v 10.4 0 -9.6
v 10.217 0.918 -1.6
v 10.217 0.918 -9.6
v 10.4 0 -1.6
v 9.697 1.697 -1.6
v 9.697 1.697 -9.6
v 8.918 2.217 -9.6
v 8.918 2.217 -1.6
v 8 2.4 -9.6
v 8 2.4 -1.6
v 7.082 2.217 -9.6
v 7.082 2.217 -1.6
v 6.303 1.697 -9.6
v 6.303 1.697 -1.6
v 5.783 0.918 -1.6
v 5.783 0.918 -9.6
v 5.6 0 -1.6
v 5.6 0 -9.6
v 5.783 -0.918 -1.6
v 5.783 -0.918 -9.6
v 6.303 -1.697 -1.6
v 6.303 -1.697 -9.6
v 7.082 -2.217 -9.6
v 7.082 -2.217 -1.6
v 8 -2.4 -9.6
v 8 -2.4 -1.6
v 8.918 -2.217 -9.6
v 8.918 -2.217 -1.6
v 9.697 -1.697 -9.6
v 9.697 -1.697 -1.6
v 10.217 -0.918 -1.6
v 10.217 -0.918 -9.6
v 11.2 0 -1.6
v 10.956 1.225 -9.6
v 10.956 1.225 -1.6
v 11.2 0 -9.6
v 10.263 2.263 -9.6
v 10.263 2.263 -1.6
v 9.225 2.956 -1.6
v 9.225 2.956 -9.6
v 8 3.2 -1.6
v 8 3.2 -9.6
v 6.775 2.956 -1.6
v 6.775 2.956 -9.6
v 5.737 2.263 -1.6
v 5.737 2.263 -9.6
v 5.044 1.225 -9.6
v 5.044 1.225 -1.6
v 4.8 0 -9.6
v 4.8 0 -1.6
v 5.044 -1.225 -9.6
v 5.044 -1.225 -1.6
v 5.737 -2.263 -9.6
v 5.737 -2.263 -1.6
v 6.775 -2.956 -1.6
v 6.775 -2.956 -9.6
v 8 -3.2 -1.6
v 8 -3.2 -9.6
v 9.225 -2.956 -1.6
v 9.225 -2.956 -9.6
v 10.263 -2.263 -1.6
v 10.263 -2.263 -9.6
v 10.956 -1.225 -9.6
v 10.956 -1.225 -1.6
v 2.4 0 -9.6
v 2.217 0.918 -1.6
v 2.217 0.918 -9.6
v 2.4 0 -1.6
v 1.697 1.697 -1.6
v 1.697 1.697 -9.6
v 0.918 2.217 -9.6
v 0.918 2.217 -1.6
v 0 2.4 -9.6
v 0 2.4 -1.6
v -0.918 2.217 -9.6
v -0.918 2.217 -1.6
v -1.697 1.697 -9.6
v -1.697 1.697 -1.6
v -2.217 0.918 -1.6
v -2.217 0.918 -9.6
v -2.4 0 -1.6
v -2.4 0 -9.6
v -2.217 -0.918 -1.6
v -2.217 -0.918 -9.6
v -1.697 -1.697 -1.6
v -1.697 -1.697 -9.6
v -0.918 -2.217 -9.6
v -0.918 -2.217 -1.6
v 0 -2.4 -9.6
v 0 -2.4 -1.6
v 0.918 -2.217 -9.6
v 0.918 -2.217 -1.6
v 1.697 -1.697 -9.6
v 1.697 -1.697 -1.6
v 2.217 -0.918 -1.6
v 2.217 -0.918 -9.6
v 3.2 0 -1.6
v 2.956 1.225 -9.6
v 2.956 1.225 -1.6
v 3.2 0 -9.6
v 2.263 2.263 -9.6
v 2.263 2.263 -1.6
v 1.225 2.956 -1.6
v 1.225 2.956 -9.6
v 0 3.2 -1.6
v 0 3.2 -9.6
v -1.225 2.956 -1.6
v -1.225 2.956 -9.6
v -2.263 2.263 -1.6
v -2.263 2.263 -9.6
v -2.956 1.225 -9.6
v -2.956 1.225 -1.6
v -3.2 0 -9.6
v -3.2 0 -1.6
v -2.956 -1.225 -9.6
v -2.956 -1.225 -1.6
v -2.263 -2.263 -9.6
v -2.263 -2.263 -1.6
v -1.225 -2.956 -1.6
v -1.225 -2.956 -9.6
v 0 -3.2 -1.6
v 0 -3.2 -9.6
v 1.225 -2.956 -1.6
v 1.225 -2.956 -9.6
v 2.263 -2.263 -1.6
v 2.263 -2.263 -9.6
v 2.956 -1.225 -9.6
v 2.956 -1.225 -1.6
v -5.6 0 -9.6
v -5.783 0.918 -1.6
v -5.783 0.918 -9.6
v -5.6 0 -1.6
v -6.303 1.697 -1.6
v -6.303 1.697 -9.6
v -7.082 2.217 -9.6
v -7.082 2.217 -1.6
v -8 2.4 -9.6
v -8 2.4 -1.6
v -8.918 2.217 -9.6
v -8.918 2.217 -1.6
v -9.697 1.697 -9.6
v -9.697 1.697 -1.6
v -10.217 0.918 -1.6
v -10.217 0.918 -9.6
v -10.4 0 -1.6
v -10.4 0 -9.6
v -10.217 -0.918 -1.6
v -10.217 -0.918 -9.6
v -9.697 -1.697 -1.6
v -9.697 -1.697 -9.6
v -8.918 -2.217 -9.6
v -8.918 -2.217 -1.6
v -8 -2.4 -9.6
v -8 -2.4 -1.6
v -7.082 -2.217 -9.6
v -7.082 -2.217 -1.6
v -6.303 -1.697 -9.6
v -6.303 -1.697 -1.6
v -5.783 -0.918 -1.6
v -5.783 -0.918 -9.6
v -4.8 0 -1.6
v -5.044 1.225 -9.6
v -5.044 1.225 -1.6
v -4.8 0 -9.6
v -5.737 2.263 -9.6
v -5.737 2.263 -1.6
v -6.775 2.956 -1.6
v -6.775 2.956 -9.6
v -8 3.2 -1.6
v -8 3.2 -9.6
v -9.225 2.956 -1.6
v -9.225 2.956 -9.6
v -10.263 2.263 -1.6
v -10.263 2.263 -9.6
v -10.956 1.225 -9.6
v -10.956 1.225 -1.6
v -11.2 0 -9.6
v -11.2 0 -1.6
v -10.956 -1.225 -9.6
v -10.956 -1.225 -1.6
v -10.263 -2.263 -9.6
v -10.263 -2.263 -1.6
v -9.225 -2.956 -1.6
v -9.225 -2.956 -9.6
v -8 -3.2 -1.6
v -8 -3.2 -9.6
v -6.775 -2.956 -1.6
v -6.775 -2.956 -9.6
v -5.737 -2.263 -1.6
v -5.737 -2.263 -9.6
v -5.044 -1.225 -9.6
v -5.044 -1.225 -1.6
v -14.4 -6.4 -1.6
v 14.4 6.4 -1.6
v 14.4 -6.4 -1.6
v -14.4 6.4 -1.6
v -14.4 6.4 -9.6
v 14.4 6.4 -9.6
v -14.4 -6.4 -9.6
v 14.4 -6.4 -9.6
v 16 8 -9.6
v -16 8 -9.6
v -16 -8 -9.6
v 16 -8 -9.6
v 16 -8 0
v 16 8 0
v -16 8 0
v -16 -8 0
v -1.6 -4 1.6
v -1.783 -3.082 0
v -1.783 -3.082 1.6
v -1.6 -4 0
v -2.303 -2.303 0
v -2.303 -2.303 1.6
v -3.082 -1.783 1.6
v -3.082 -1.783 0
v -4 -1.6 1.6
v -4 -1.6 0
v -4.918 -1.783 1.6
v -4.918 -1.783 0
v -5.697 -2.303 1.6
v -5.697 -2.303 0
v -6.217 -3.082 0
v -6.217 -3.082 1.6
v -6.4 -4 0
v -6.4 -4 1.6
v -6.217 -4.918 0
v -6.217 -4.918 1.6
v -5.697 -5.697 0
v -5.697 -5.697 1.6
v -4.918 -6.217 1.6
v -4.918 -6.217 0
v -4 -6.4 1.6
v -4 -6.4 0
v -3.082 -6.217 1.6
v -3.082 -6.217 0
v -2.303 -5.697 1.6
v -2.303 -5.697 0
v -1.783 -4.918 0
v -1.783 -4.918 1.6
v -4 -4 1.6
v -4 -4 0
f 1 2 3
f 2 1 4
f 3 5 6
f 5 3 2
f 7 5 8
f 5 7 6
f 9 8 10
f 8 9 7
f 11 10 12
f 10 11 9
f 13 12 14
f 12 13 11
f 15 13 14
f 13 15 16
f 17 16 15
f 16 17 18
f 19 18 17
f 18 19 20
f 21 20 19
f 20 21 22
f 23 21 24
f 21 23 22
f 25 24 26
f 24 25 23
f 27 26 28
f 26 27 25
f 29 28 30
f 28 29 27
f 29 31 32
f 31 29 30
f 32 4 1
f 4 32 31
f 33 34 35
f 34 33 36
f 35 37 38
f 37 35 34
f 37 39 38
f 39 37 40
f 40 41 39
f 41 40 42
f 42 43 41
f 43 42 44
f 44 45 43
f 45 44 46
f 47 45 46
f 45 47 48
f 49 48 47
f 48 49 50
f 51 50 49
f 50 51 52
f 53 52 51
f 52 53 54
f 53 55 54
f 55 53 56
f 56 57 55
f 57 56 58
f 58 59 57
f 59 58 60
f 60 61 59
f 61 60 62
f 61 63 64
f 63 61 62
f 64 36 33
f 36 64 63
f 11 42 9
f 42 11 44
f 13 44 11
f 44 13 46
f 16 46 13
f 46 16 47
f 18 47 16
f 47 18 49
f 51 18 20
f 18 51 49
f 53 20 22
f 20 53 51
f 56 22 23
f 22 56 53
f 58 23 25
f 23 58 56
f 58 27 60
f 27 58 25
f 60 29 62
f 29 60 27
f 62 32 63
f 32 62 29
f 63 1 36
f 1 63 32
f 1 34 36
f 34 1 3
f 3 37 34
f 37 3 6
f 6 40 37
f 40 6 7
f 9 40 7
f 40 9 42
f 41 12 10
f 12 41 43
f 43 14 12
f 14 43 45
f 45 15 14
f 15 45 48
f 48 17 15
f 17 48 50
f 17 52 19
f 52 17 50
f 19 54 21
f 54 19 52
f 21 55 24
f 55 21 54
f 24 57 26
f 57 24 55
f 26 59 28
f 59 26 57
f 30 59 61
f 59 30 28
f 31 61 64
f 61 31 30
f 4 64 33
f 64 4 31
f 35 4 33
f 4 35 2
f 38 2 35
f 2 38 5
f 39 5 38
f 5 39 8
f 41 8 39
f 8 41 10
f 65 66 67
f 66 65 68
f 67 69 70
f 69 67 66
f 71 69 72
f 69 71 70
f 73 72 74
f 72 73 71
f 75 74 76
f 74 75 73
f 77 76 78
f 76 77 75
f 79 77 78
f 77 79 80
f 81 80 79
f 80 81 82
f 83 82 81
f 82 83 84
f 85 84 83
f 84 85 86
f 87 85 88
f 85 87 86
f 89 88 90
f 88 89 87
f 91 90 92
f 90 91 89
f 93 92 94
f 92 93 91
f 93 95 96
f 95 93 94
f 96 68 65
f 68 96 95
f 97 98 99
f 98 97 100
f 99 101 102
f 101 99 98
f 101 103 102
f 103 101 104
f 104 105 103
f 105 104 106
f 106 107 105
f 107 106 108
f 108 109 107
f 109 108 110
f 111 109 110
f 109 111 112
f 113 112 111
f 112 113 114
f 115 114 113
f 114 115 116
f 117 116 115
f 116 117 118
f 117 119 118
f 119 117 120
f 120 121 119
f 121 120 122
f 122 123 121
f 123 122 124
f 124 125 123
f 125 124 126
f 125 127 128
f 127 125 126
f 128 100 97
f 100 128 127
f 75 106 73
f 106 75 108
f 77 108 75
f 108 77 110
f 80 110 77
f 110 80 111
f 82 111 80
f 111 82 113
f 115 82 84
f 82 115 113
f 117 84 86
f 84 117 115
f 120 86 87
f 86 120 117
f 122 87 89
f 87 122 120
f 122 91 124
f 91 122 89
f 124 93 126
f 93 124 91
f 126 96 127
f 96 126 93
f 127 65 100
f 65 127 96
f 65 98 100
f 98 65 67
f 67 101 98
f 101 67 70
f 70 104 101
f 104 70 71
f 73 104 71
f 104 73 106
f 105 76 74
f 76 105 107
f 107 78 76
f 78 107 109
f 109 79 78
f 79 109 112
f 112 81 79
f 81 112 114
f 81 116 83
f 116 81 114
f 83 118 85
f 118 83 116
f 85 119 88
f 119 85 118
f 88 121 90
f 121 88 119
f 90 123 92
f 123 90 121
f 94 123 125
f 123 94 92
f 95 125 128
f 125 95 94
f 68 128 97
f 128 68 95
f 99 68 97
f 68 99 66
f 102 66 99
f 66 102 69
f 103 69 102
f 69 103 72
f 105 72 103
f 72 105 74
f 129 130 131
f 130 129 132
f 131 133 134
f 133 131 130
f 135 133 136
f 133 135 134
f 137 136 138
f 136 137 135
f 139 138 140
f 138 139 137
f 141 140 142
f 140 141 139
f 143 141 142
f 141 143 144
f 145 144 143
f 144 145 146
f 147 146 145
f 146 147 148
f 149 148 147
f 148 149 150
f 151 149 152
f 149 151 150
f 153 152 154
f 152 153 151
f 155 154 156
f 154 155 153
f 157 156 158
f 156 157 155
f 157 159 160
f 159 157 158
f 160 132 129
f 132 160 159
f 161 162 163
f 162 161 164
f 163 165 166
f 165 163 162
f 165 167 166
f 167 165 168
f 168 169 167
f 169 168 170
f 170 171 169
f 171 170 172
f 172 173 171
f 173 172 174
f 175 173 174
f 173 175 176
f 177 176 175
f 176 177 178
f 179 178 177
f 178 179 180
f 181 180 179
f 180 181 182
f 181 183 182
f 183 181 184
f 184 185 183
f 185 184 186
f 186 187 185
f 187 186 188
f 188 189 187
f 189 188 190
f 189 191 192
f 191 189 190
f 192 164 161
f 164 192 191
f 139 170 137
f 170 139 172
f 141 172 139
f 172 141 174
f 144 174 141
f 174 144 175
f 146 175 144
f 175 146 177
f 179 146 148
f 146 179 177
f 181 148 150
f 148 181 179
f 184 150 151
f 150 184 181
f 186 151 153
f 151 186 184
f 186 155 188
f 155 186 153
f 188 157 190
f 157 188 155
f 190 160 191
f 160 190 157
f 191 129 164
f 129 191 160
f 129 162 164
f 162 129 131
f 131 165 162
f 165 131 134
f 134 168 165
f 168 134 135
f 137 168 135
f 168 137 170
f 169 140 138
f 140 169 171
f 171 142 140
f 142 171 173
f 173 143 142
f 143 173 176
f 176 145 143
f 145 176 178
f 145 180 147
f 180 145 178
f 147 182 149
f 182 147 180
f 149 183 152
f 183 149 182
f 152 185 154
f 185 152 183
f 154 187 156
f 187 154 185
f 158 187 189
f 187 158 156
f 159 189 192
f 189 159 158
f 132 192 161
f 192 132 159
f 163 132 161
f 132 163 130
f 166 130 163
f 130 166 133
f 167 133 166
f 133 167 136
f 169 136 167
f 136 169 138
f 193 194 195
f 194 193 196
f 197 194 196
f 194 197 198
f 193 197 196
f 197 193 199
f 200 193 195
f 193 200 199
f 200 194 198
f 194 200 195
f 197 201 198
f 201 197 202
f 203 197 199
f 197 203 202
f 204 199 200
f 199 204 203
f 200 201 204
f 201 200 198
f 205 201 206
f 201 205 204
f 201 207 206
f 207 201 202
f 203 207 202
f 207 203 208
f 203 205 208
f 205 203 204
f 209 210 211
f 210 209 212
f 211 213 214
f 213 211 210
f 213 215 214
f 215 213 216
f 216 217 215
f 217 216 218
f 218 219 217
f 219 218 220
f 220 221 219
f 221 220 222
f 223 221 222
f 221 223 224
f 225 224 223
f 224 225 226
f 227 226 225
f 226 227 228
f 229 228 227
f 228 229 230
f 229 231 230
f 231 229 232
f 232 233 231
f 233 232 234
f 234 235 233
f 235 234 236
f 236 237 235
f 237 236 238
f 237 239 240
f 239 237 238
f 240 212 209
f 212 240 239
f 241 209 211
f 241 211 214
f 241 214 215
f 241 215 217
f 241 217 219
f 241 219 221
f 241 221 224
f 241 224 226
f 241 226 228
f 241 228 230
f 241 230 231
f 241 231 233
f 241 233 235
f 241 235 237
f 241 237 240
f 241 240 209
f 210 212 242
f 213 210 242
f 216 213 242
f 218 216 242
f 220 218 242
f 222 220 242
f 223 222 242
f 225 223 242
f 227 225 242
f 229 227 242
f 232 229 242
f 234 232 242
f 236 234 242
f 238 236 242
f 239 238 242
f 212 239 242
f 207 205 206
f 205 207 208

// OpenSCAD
// file: ../p/4-4ring3.scad
use <../lib.scad>
$fa=1; $fs=0.2;
function ldraw_lib__4_4ring3(realsolid=false) = [
// 0 Ring  3 x 1.0
// 0 Name: 4-4ring3.dat
// 0 Author: James Jessiman
// 0 !LDRAW_ORG Primitive UPDATE 2009-01
// 0 !LICENSE Licensed under CC BY 2.0 and CC BY 4.0 : see CAreadme.txt
// 
// 0 BFC CERTIFY CCW
  [0,"BFC","CERTIFY"],
  [0,"BFC","CCW"],
// 
// 0 !HISTORY 1998-12-15 [PTadmin] Official Update 1998-10
// 0 !HISTORY 2002-04-05 [hafhead] Added BFC statement
// 0 !HISTORY 2002-04-25 [PTadmin] Official Update 2002-02
// 0 !HISTORY 2007-06-24 [PTadmin] Header formatted for Contributor Agreement
// 0 !HISTORY 2008-07-01 [PTadmin] Official Update 2008-01
// 0 !HISTORY 2008-08-26 [cwdee] Switch polygon winding and rename
// 0 !HISTORY 2009-05-02 [PTadmin] Official Update 2009-01
// 
// 
// 4 16 -1.5308 0 3.6956 -1.1481 0 2.7717 0 0 3 0 0 4
  [4,16,-1.5308,0,3.6956,-1.1481,0,2.7717,0,0,3,0,0,4],
// 4 16 -2.8284 0 2.8284 -2.1213 0 2.1213 -1.1481 0 2.7717 -1.5308 0 3.6956
  [4,16,-2.8284,0,2.8284,-2.1213,0,2.1213,-1.1481,0,2.7717,-1.5308,0,3.6956],
// 4 16 -3.6956 0 1.5308 -2.7717 0 1.1481 -2.1213 0 2.1213 -2.8284 0 2.8284
  [4,16,-3.6956,0,1.5308,-2.7717,0,1.1481,-2.1213,0,2.1213,-2.8284,0,2.8284],
// 4 16 -4 0 0 -3 0 0 -2.7717 0 1.1481 -3.6956 0 1.5308
  [4,16,-4,0,0,-3,0,0,-2.7717,0,1.1481,-3.6956,0,1.5308],
// 4 16 -3.6956 0 -1.5308 -2.7717 0 -1.1481 -3 0 0 -4 0 0
  [4,16,-3.6956,0,-1.5308,-2.7717,0,-1.1481,-3,0,0,-4,0,0],
// 4 16 -2.8284 0 -2.8284 -2.1213 0 -2.1213 -2.7717 0 -1.1481 -3.6956 0 -1.5308
  [4,16,-2.8284,0,-2.8284,-2.1213,0,-2.1213,-2.7717,0,-1.1481,-3.6956,0,-1.5308],
// 4 16 -1.5308 0 -3.6956 -1.1481 0 -2.7717 -2.1213 0 -2.1213 -2.8284 0 -2.8284
  [4,16,-1.5308,0,-3.6956,-1.1481,0,-2.7717,-2.1213,0,-2.1213,-2.8284,0,-2.8284],
// 4 16 0 0 -4 0 0 -3 -1.1481 0 -2.7717 -1.5308 0 -3.6956
  [4,16,0,0,-4,0,0,-3,-1.1481,0,-2.7717,-1.5308,0,-3.6956],
// 4 16 1.5308 0 -3.6956 1.1481 0 -2.7717 0 0 -3 0 0 -4
  [4,16,1.5308,0,-3.6956,1.1481,0,-2.7717,0,0,-3,0,0,-4],
// 4 16 2.8284 0 -2.8284 2.1213 0 -2.1213 1.1481 0 -2.7717 1.5308 0 -3.6956
  [4,16,2.8284,0,-2.8284,2.1213,0,-2.1213,1.1481,0,-2.7717,1.5308,0,-3.6956],
// 4 16 3.6956 0 -1.5308 2.7717 0 -1.1481 2.1213 0 -2.1213 2.8284 0 -2.8284
  [4,16,3.6956,0,-1.5308,2.7717,0,-1.1481,2.1213,0,-2.1213,2.8284,0,-2.8284],
// 4 16 4 0 0 3 0 0 2.7717 0 -1.1481 3.6956 0 -1.5308
  [4,16,4,0,0,3,0,0,2.7717,0,-1.1481,3.6956,0,-1.5308],
// 4 16 3.6956 0 1.5308 2.7717 0 1.1481 3 0 0 4 0 0
  [4,16,3.6956,0,1.5308,2.7717,0,1.1481,3,0,0,4,0,0],
// 4 16 2.8284 0 2.8284 2.1213 0 2.1213 2.7717 0 1.1481 3.6956 0 1.5308
  [4,16,2.8284,0,2.8284,2.1213,0,2.1213,2.7717,0,1.1481,3.6956,0,1.5308],
// 4 16 1.5308 0 3.6956 1.1481 0 2.7717 2.1213 0 2.1213 2.8284 0 2.8284
  [4,16,1.5308,0,3.6956,1.1481,0,2.7717,2.1213,0,2.1213,2.8284,0,2.8284],
// 4 16 0 0 4 0 0 3 1.1481 0 2.7717 1.5308 0 3.6956
  [4,16,0,0,4,0,0,3,1.1481,0,2.7717,1.5308,0,3.6956],
// 0
];
module ldraw_lib__4_4ring3(step=0, col=false, unit=2/5, alt=false, line=0.2, solid=!$preview)
    makepoly(ldraw_lib__4_4ring3(solid), step=step, col=col, unit=unit, alt=alt, line=line, solid=solid);
ldraw_lib__4_4ring3(line=0.2);
// file: ../p/4-4edge.scad
use <../lib.scad>
function ldraw_lib__4_4edge() = [
// 0 Circle 1.0
// 0 Name: 4-4edge.dat
// 0 Author: James Jessiman
// 0 !LDRAW_ORG Primitive UPDATE 2017-01
// 0 !LICENSE Licensed under CC BY 2.0 and CC BY 4.0 : see CAreadme.txt
// 
// 0 BFC CERTIFY CCW
  [0,"BFC","CERTIFY"],
  [0,"BFC","CCW"],
// 
// 0 !HISTORY 1998-12-15 [PTadmin] Official Update 1998-10
// 0 !HISTORY 2005-12-28 [PTadmin] Official Update 2005-01
// 0 !HISTORY 2007-06-24 [PTadmin] Header formatted for Contributor Agreement
// 0 !HISTORY 2008-07-01 [PTadmin] Official Update 2008-01
// 0 !HISTORY 2017-01-15 [Steffen] BFCed
// 0 !HISTORY 2017-12-30 [PTadmin] Official Update 2017-01
// 
// 
// 2 24 1 0 0 0.9239 0 0.3827
  [2,24,1,0,0,0.9239,0,0.3827],
// 2 24 0.9239 0 0.3827 0.7071 0 0.7071
  [2,24,0.9239,0,0.3827,0.7071,0,0.7071],
// 2 24 0.7071 0 0.7071 0.3827 0 0.9239
  [2,24,0.7071,0,0.7071,0.3827,0,0.9239],
// 2 24 0.3827 0 0.9239 0 0 1
  [2,24,0.3827,0,0.9239,0,0,1],
// 2 24 0 0 1 -0.3827 0 0.9239
  [2,24,0,0,1,-0.3827,0,0.9239],
// 2 24 -0.3827 0 0.9239 -0.7071 0 0.7071
  [2,24,-0.3827,0,0.9239,-0.7071,0,0.7071],
// 2 24 -0.7071 0 0.7071 -0.9239 0 0.3827
  [2,24,-0.7071,0,0.7071,-0.9239,0,0.3827],
// 2 24 -0.9239 0 0.3827 -1 0 -0
  [2,24,-0.9239,0,0.3827,-1,0,-0],
// 2 24 -1 0 -0 -0.9239 0 -0.3827
  [2,24,-1,0,-0,-0.9239,0,-0.3827],
// 2 24 -0.9239 0 -0.3827 -0.7071 0 -0.7071
  [2,24,-0.9239,0,-0.3827,-0.7071,0,-0.7071],
// 2 24 -0.7071 0 -0.7071 -0.3827 0 -0.9239
  [2,24,-0.7071,0,-0.7071,-0.3827,0,-0.9239],
// 2 24 -0.3827 0 -0.9239 0 0 -1
  [2,24,-0.3827,0,-0.9239,0,0,-1],
// 2 24 0 0 -1 0.3827 0 -0.9239
  [2,24,0,0,-1,0.3827,0,-0.9239],
// 2 24 0.3827 0 -0.9239 0.7071 0 -0.7071
  [2,24,0.3827,0,-0.9239,0.7071,0,-0.7071],
// 2 24 0.7071 0 -0.7071 0.9239 0 -0.3827
  [2,24,0.7071,0,-0.7071,0.9239,0,-0.3827],
// 2 24 0.9239 0 -0.3827 1 0 0
  [2,24,0.9239,0,-0.3827,1,0,0],
];
module ldraw_lib__4_4edge(step=0, col=false, unit=2/5, alt=false, line=0.2, solid=!$preview)
    makepoly(ldraw_lib__4_4edge(), step=step, col=col, unit=unit, alt=alt, line=line, solid=solid);
ldraw_lib__4_4edge(line=0.2);
// file: ../p/4-4disc.scad
use <../lib.scad>
function ldraw_lib__4_4disc() = [
// 0 Disc 1.0
// 0 Name: 4-4disc.dat
// 0 Author: James Jessiman
// 0 !LDRAW_ORG Primitive UPDATE 2002-02
// 0 !LICENSE Licensed under CC BY 2.0 and CC BY 4.0 : see CAreadme.txt
// 
// 0 BFC CERTIFY CCW
  [0,"BFC","CERTIFY"],
  [0,"BFC","CCW"],
// 
// 0 !HISTORY 1998-12-15 [PTadmin] Official Update 1998-10
// 0 !HISTORY 2002-03-23 [sbliss] Added BFC statement
// 0 !HISTORY 2002-04-25 [PTadmin] Official Update 2002-02
// 0 !HISTORY 2007-06-24 [PTadmin] Header formatted for Contributor Agreement
// 0 !HISTORY 2008-07-01 [PTadmin] Official Update 2008-01
// 
// 
// 3 16 0 0 0 1 0 0 0.9239 0 0.3827
  [3,16,0,0,0,1,0,0,0.9239,0,0.3827],
// 3 16 0 0 0 0.9239 0 0.3827 0.7071 0 0.7071
  [3,16,0,0,0,0.9239,0,0.3827,0.7071,0,0.7071],
// 3 16 0 0 0 0.7071 0 0.7071 0.3827 0 0.9239
  [3,16,0,0,0,0.7071,0,0.7071,0.3827,0,0.9239],
// 3 16 0 0 0 0.3827 0 0.9239 0 0 1
  [3,16,0,0,0,0.3827,0,0.9239,0,0,1],
// 3 16 0 0 0 0 0 1 -0.3827 0 0.9239
  [3,16,0,0,0,0,0,1,-0.3827,0,0.9239],
// 3 16 0 0 0 -0.3827 0 0.9239 -0.7071 0 0.7071
  [3,16,0,0,0,-0.3827,0,0.9239,-0.7071,0,0.7071],
// 3 16 0 0 0 -0.7071 0 0.7071 -0.9239 0 0.3827
  [3,16,0,0,0,-0.7071,0,0.7071,-0.9239,0,0.3827],
// 3 16 0 0 0 -0.9239 0 0.3827 -1 0 -0
  [3,16,0,0,0,-0.9239,0,0.3827,-1,0,-0],
// 3 16 0 0 0 -1 0 -0 -0.9239 0 -0.3827
  [3,16,0,0,0,-1,0,-0,-0.9239,0,-0.3827],
// 3 16 0 0 0 -0.9239 0 -0.3827 -0.7071 0 -0.7071
  [3,16,0,0,0,-0.9239,0,-0.3827,-0.7071,0,-0.7071],
// 3 16 0 0 0 -0.7071 0 -0.7071 -0.3827 0 -0.9239
  [3,16,0,0,0,-0.7071,0,-0.7071,-0.3827,0,-0.9239],
// 3 16 0 0 0 -0.3827 0 -0.9239 0 0 -1
  [3,16,0,0,0,-0.3827,0,-0.9239,0,0,-1],
// 3 16 0 0 0 0 0 -1 0.3827 0 -0.9239
  [3,16,0,0,0,0,0,-1,0.3827,0,-0.9239],
// 3 16 0 0 0 0.3827 0 -0.9239 0.7071 0 -0.7071
  [3,16,0,0,0,0.3827,0,-0.9239,0.7071,0,-0.7071],
// 3 16 0 0 0 0.7071 0 -0.7071 0.9239 0 -0.3827
  [3,16,0,0,0,0.7071,0,-0.7071,0.9239,0,-0.3827],
// 3 16 0 0 0 0.9239 0 -0.3827 1 0 0
  [3,16,0,0,0,0.9239,0,-0.3827,1,0,0],
// 0
];
module ldraw_lib__4_4disc(step=0, col=false, unit=2/5, alt=false, line=0.2, solid=!$preview)
    makepoly(ldraw_lib__4_4disc(), step=step, col=col, unit=unit, alt=alt, line=line, solid=solid);
ldraw_lib__4_4disc(line=0.2);
// file: ../p/4-4cyli.scad
use <../lib.scad>
$fa=1; $fs=0.2;
function ldraw_lib__4_4cyli(realsolid=false) = [
// 0 Cylinder 1.0
// 0 Name: 4-4cyli.dat
// 0 Author: James Jessiman
// 0 !LDRAW_ORG Primitive UPDATE 2005-01
// 0 !LICENSE Licensed under CC BY 2.0 and CC BY 4.0 : see CAreadme.txt
// 
// 0 BFC CERTIFY CCW
  [0,"BFC","CERTIFY"],
  [0,"BFC","CCW"],
// 
// 0 !HISTORY 1998-12-15 [PTadmin] Official Update 1998-10
// 0 !HISTORY 2002-03-23 [sbliss] Added BFC statement; merged headers from files in distributions LDraw 0.27 and Complete.
// 0 !HISTORY 2002-04-25 [PTadmin] Official Update 2002-02
// 0 !HISTORY 2004-12-14 [guyvivan] BFC CCW
// 0 !HISTORY 2005-12-28 [PTadmin] Official Update 2005-01
// 0 !HISTORY 2007-06-24 [PTadmin] Header formatted for Contributor Agreement
// 0 !HISTORY 2008-07-01 [PTadmin] Official Update 2008-01
// 
// 
// 4 16 1 1 0 0.9239 1 0.3827 0.9239 0 0.3827 1 0 0
  [4,16,1,1,0,0.9239,1,0.3827,0.9239,0,0.3827,1,0,0],
// 5 24 1 0 0 1 1 0 0.9239 0 0.3827 0.9239 0 -0.3827
  [5,24,1,0,0,1,1,0,0.9239,0,0.3827,0.9239,0,-0.3827],
// 4 16 0.9239 1 0.3827 0.7071 1 0.7071 0.7071 0 0.7071 0.9239 0 0.3827
  [4,16,0.9239,1,0.3827,0.7071,1,0.7071,0.7071,0,0.7071,0.9239,0,0.3827],
// 5 24 0.9239 0 0.3827 0.9239 1 0.3827 0.7071 0 0.7071 1 0 0
  [5,24,0.9239,0,0.3827,0.9239,1,0.3827,0.7071,0,0.7071,1,0,0],
// 4 16 0.7071 1 0.7071 0.3827 1 0.9239 0.3827 0 0.9239 0.7071 0 0.7071
  [4,16,0.7071,1,0.7071,0.3827,1,0.9239,0.3827,0,0.9239,0.7071,0,0.7071],
// 5 24 0.7071 0 0.7071 0.7071 1 0.7071 0.3827 0 0.9239 0.9239 0 0.3827
  [5,24,0.7071,0,0.7071,0.7071,1,0.7071,0.3827,0,0.9239,0.9239,0,0.3827],
// 4 16 0.3827 1 0.9239 0 1 1 0 0 1 0.3827 0 0.9239
  [4,16,0.3827,1,0.9239,0,1,1,0,0,1,0.3827,0,0.9239],
// 5 24 0.3827 0 0.9239 0.3827 1 0.9239 0 0 1 0.7071 0 0.7071
  [5,24,0.3827,0,0.9239,0.3827,1,0.9239,0,0,1,0.7071,0,0.7071],
// 4 16 0 1 1 -0.3827 1 0.9239 -0.3827 0 0.9239 0 0 1
  [4,16,0,1,1,-0.3827,1,0.9239,-0.3827,0,0.9239,0,0,1],
// 5 24 0 0 1 0 1 1 -0.3827 0 0.9239 0.3827 0 0.9239
  [5,24,0,0,1,0,1,1,-0.3827,0,0.9239,0.3827,0,0.9239],
// 4 16 -0.3827 1 0.9239 -0.7071 1 0.7071 -0.7071 0 0.7071 -0.3827 0 0.9239
  [4,16,-0.3827,1,0.9239,-0.7071,1,0.7071,-0.7071,0,0.7071,-0.3827,0,0.9239],
// 5 24 -0.3827 0 0.9239 -0.3827 1 0.9239 -0.7071 0 0.7071 0 0 1
  [5,24,-0.3827,0,0.9239,-0.3827,1,0.9239,-0.7071,0,0.7071,0,0,1],
// 4 16 -0.7071 1 0.7071 -0.9239 1 0.3827 -0.9239 0 0.3827 -0.7071 0 0.7071
  [4,16,-0.7071,1,0.7071,-0.9239,1,0.3827,-0.9239,0,0.3827,-0.7071,0,0.7071],
// 5 24 -0.7071 0 0.7071 -0.7071 1 0.7071 -0.9239 0 0.3827 -0.3827 0 0.9239
  [5,24,-0.7071,0,0.7071,-0.7071,1,0.7071,-0.9239,0,0.3827,-0.3827,0,0.9239],
// 4 16 -0.9239 1 0.3827 -1 1 0 -1 0 0 -0.9239 0 0.3827
  [4,16,-0.9239,1,0.3827,-1,1,0,-1,0,0,-0.9239,0,0.3827],
// 5 24 -0.9239 0 0.3827 -0.9239 1 0.3827 -1 0 0 -0.7071 0 0.7071
  [5,24,-0.9239,0,0.3827,-0.9239,1,0.3827,-1,0,0,-0.7071,0,0.7071],
// 4 16 -1 1 0 -0.9239 1 -0.3827 -0.9239 0 -0.3827 -1 0 0
  [4,16,-1,1,0,-0.9239,1,-0.3827,-0.9239,0,-0.3827,-1,0,0],
// 5 24 -1 0 0 -1 1 0 -0.9239 0 -0.3827 -0.9239 0 0.3827
  [5,24,-1,0,0,-1,1,0,-0.9239,0,-0.3827,-0.9239,0,0.3827],
// 4 16 -0.9239 1 -0.3827 -0.7071 1 -0.7071 -0.7071 0 -0.7071 -0.9239 0 -0.3827
  [4,16,-0.9239,1,-0.3827,-0.7071,1,-0.7071,-0.7071,0,-0.7071,-0.9239,0,-0.3827],
// 5 24 -0.9239 0 -0.3827 -0.9239 1 -0.3827 -0.7071 0 -0.7071 -1 0 0
  [5,24,-0.9239,0,-0.3827,-0.9239,1,-0.3827,-0.7071,0,-0.7071,-1,0,0],
// 4 16 -0.7071 1 -0.7071 -0.3827 1 -0.9239 -0.3827 0 -0.9239 -0.7071 0 -0.7071
  [4,16,-0.7071,1,-0.7071,-0.3827,1,-0.9239,-0.3827,0,-0.9239,-0.7071,0,-0.7071],
// 5 24 -0.7071 0 -0.7071 -0.7071 1 -0.7071 -0.3827 0 -0.9239 -0.9239 0 -0.3827
  [5,24,-0.7071,0,-0.7071,-0.7071,1,-0.7071,-0.3827,0,-0.9239,-0.9239,0,-0.3827],
// 4 16 -0.3827 1 -0.9239 0 1 -1 0 0 -1 -0.3827 0 -0.9239
  [4,16,-0.3827,1,-0.9239,0,1,-1,0,0,-1,-0.3827,0,-0.9239],
// 5 24 -0.3827 0 -0.9239 -0.3827 1 -0.9239 0 0 -1 -0.7071 0 -0.7071
  [5,24,-0.3827,0,-0.9239,-0.3827,1,-0.9239,0,0,-1,-0.7071,0,-0.7071],
// 4 16 0 1 -1 0.3827 1 -0.9239 0.3827 0 -0.9239 0 0 -1
  [4,16,0,1,-1,0.3827,1,-0.9239,0.3827,0,-0.9239,0,0,-1],
// 5 24 0 0 -1 0 1 -1 0.3827 0 -0.9239 -0.3827 0 -0.9239
  [5,24,0,0,-1,0,1,-1,0.3827,0,-0.9239,-0.3827,0,-0.9239],
// 4 16 0.3827 1 -0.9239 0.7071 1 -0.7071 0.7071 0 -0.7071 0.3827 0 -0.9239
  [4,16,0.3827,1,-0.9239,0.7071,1,-0.7071,0.7071,0,-0.7071,0.3827,0,-0.9239],
// 5 24 0.3827 0 -0.9239 0.3827 1 -0.9239 0.7071 0 -0.7071 0 0 -1
  [5,24,0.3827,0,-0.9239,0.3827,1,-0.9239,0.7071,0,-0.7071,0,0,-1],
// 4 16 0.7071 1 -0.7071 0.9239 1 -0.3827 0.9239 0 -0.3827 0.7071 0 -0.7071
  [4,16,0.7071,1,-0.7071,0.9239,1,-0.3827,0.9239,0,-0.3827,0.7071,0,-0.7071],
// 5 24 0.7071 0 -0.7071 0.7071 1 -0.7071 0.9239 0 -0.3827 0.3827 0 -0.9239
  [5,24,0.7071,0,-0.7071,0.7071,1,-0.7071,0.9239,0,-0.3827,0.3827,0,-0.9239],
// 4 16 0.9239 1 -0.3827 1 1 0 1 0 0 0.9239 0 -0.3827
  [4,16,0.9239,1,-0.3827,1,1,0,1,0,0,0.9239,0,-0.3827],
// 5 24 0.9239 0 -0.3827 0.9239 1 -0.3827 1 0 0 0.7071 0 -0.7071
  [5,24,0.9239,0,-0.3827,0.9239,1,-0.3827,1,0,0,0.7071,0,-0.7071],
// 0
];
module ldraw_lib__4_4cyli(step=0, col=false, unit=2/5, alt=false, line=0.2, solid=!$preview)
    makepoly(ldraw_lib__4_4cyli(solid), step=step, col=col, unit=unit, alt=alt, line=line, solid=solid);
ldraw_lib__4_4cyli(line=0.2);
// file: ../p/stud4.scad
use <../lib.scad>
use <4-4cyli.scad>
use <4-4edge.scad>
use <4-4ring3.scad>
function ldraw_lib__stud4() = [
// 0 Stud Tube Open
// 0 Name: stud4.dat
// 0 Author: James Jessiman
// 0 !LDRAW_ORG Primitive UPDATE 2009-02
// 0 !LICENSE Licensed under CC BY 4.0 : see CAreadme.txt
// 
// 0 BFC CERTIFY CCW
  [0,"BFC","CERTIFY"],
  [0,"BFC","CCW"],
// 
// 0 !HISTORY 1999-07-05 [PTadmin] Official Update 1999-05
// 0 !HISTORY 2002-04-04 [sbliss] Modified for BFC compliance
// 0 !HISTORY 2002-04-25 [PTadmin] Official Update 2002-02
// 0 !HISTORY 2007-06-24 [PTadmin] Header formatted for Contributor Agreement
// 0 !HISTORY 2008-07-01 [PTadmin] Official Update 2008-01
// 0 !HISTORY 2009-06-21 [cwdee] Update ring references to 4-4ring
// 0 !HISTORY 2009-09-03 [PTadmin] Official Update 2009-02
// 
// 
// 1 16 0 -4 0 6 0 0 0 1 0 0 0 6 4-4edge.dat
  [1,16,0,-4,0,6,0,0,0,1,0,0,0,6, ldraw_lib__4_4edge()],
// 1 16 0 -4 0 8 0 0 0 1 0 0 0 8 4-4edge.dat
  [1,16,0,-4,0,8,0,0,0,1,0,0,0,8, ldraw_lib__4_4edge()],
// 1 16 0 0 0 6 0 0 0 1 0 0 0 6 4-4edge.dat
  [1,16,0,0,0,6,0,0,0,1,0,0,0,6, ldraw_lib__4_4edge()],
// 1 16 0 0 0 8 0 0 0 1 0 0 0 8 4-4edge.dat
  [1,16,0,0,0,8,0,0,0,1,0,0,0,8, ldraw_lib__4_4edge()],
// 0 BFC INVERTNEXT
  [0,"BFC","INVERTNEXT"],
// 1 16 0 -4 0 6 0 0 0 4 0 0 0 6 4-4cyli.dat
  [1,16,0,-4,0,6,0,0,0,4,0,0,0,6, ldraw_lib__4_4cyli()],
// 1 16 0 -4 0 8 0 0 0 4 0 0 0 8 4-4cyli.dat
  [1,16,0,-4,0,8,0,0,0,4,0,0,0,8, ldraw_lib__4_4cyli()],
// 1 16 0 -4 0 2 0 0 0 1 0 0 0 2 4-4ring3.dat
  [1,16,0,-4,0,2,0,0,0,1,0,0,0,2, ldraw_lib__4_4ring3()],
  [-1,16,0,0,0,2,0,0,0,-1,0,0,0,2, ldraw_lib__4_4ring3()],
// 0
];
module ldraw_lib__stud4(step=0, col=false, unit=2/5, alt=false, line=0.2, solid=!$preview)
    makepoly(ldraw_lib__stud4(), step=step, col=col, unit=unit, alt=alt, line=line, solid=solid);
ldraw_lib__stud4(line=0.2);
// file: ../p/box5.scad
use <../lib.scad>
function ldraw_lib__box5() = [
// 0 Box with 5 Faces and All Edges
// 0 Name: box5.dat
// 0 Author: James Jessiman
// 0 !LDRAW_ORG Primitive UPDATE 2012-01
// 0 !LICENSE Licensed under CC BY 2.0 and CC BY 4.0 : see CAreadme.txt
// 
// 0 BFC CERTIFY CCW
  [0,"BFC","CERTIFY"],
  [0,"BFC","CCW"],
// 
// 0 !HISTORY 2002-04-03 [sbliss] Modified for BFC compliance
// 0 !HISTORY 2002-04-25 [PTadmin] Official Update 2002-02
// 0 !HISTORY 2007-06-24 [PTadmin] Header formatted for Contributor Agreement
// 0 !HISTORY 2008-07-01 [PTadmin] Official Update 2008-01
// 0 !HISTORY 2012-02-16 [Philo] Changed to CCW
// 0 !HISTORY 2012-03-30 [PTadmin] Official Update 2012-01
// 
// 
// 2 24 1 1 1 -1 1 1
  [2,24,1,1,1,-1,1,1],
// 2 24 -1 1 1 -1 1 -1
  [2,24,-1,1,1,-1,1,-1],
// 2 24 -1 1 -1 1 1 -1
  [2,24,-1,1,-1,1,1,-1],
// 2 24 1 1 -1 1 1 1
  [2,24,1,1,-1,1,1,1],
// 2 24 1 0 1 -1 0 1
  [2,24,1,0,1,-1,0,1],
// 2 24 -1 0 1 -1 0 -1
  [2,24,-1,0,1,-1,0,-1],
// 2 24 -1 0 -1 1 0 -1
  [2,24,-1,0,-1,1,0,-1],
// 2 24 1 0 -1 1 0 1
  [2,24,1,0,-1,1,0,1],
// 2 24 1 0 1 1 1 1
  [2,24,1,0,1,1,1,1],
// 2 24 -1 0 1 -1 1 1
  [2,24,-1,0,1,-1,1,1],
// 2 24 1 0 -1 1 1 -1
  [2,24,1,0,-1,1,1,-1],
// 2 24 -1 0 -1 -1 1 -1
  [2,24,-1,0,-1,-1,1,-1],
// 4 16 -1 1 1 1 1 1 1 1 -1 -1 1 -1
  [4,16,-1,1,1,1,1,1,1,1,-1,-1,1,-1],
// 4 16 -1 1 1 -1 0 1 1 0 1 1 1 1
  [4,16,-1,1,1,-1,0,1,1,0,1,1,1,1],
// 4 16 -1 1 -1 -1 0 -1 -1 0 1 -1 1 1
  [4,16,-1,1,-1,-1,0,-1,-1,0,1,-1,1,1],
// 4 16 1 1 -1 1 0 -1 -1 0 -1 -1 1 -1
  [4,16,1,1,-1,1,0,-1,-1,0,-1,-1,1,-1],
// 4 16 1 1 1 1 0 1 1 0 -1 1 1 -1
  [4,16,1,1,1,1,0,1,1,0,-1,1,1,-1],
];
makepoly(ldraw_lib__box5(), line=0.2);
// file: ../p/box4.scad
use <../lib.scad>
function ldraw_lib__box4() = [
// 0 Box with 4 Faces (2 Parallel Pairs) and All Edges
// 0 Name: box4.dat
// 0 Author: James Jessiman
// 0 !LDRAW_ORG Primitive UPDATE 2012-01
// 0 !LICENSE Licensed under CC BY 4.0 : see CAreadme.txt
// 
// 0 BFC CERTIFY CCW
  [0,"BFC","CERTIFY"],
  [0,"BFC","CCW"],
// 
// 0 !HISTORY 2002-04-03 [sbliss] Modified for BFC compliance
// 0 !HISTORY 2002-04-25 [PTadmin] Official Update 2002-02
// 0 !HISTORY 2007-06-24 [PTadmin] Header formatted for Contributor Agreement
// 0 !HISTORY 2008-07-01 [PTadmin] Official Update 2008-01
// 0 !HISTORY 2012-02-16 [Philo] Changed to CCW
// 0 !HISTORY 2012-03-30 [PTadmin] Official Update 2012-01
// 
// 
// 2 24 1 1 1 -1 1 1
  [2,24,1,1,1,-1,1,1],
// 2 24 -1 1 1 -1 1 -1
  [2,24,-1,1,1,-1,1,-1],
// 2 24 -1 1 -1 1 1 -1
  [2,24,-1,1,-1,1,1,-1],
// 2 24 1 1 -1 1 1 1
  [2,24,1,1,-1,1,1,1],
// 2 24 1 0 1 -1 0 1
  [2,24,1,0,1,-1,0,1],
// 2 24 -1 0 1 -1 0 -1
  [2,24,-1,0,1,-1,0,-1],
// 2 24 -1 0 -1 1 0 -1
  [2,24,-1,0,-1,1,0,-1],
// 2 24 1 0 -1 1 0 1
  [2,24,1,0,-1,1,0,1],
// 2 24 1 0 1 1 1 1
  [2,24,1,0,1,1,1,1],
// 2 24 -1 0 1 -1 1 1
  [2,24,-1,0,1,-1,1,1],
// 2 24 1 0 -1 1 1 -1
  [2,24,1,0,-1,1,1,-1],
// 2 24 -1 0 -1 -1 1 -1
  [2,24,-1,0,-1,-1,1,-1],
// 4 16 -1 1 1 -1 0 1 1 0 1 1 1 1
  [4,16,-1,1,1,-1,0,1,1,0,1,1,1,1],
// 4 16 -1 1 -1 -1 0 -1 -1 0 1 -1 1 1
  [4,16,-1,1,-1,-1,0,-1,-1,0,1,-1,1,1],
// 4 16 1 1 -1 1 0 -1 -1 0 -1 -1 1 -1
  [4,16,1,1,-1,1,0,-1,-1,0,-1,-1,1,-1],
// 4 16 1 1 1 1 0 1 1 0 -1 1 1 -1
  [4,16,1,1,1,1,0,1,1,0,-1,1,1,-1],
];
module ldraw_lib__box4(step=0, col=false, unit=2/5, alt=false, line=0.2, solid=!$preview)
    makepoly(ldraw_lib__box4(), step=step, col=col, unit=unit, alt=alt, line=line, solid=solid);
ldraw_lib__box4(line=0.2);
// file: ../p/stud.scad
use <../lib.scad>
use <4-4cyli.scad>
use <4-4disc.scad>
use <4-4edge.scad>
function ldraw_lib__stud() = [
// 0 Stud
// 0 Name: stud.dat
// 0 Author: James Jessiman
// 0 !LDRAW_ORG Primitive UPDATE 2012-01
// 0 !LICENSE Licensed under CC BY 4.0 : see CAreadme.txt
// 
// 0 BFC CERTIFY CCW
  [0,"BFC","CERTIFY"],
  [0,"BFC","CCW"],
// 
// 0 !HISTORY 2002-04-04 [sbliss] Modified for BFC compliance
// 0 !HISTORY 2002-04-25 [PTadmin] Official Update 2002-02
// 0 !HISTORY 2007-06-24 [PTadmin] Header formatted for Contributor Agreement
// 0 !HISTORY 2008-07-01 [PTadmin] Official Update 2008-01
// 0 !HISTORY 2012-02-16 [Philo] Changed to CCW
// 0 !HISTORY 2012-03-30 [PTadmin] Official Update 2012-01
// 
// 
// 1 16 0 0 0 6 0 0 0 1 0 0 0 6 4-4edge.dat
  [1,16,0,0,0,6,0,0,0,1,0,0,0,6, ldraw_lib__4_4edge()],
// 1 16 0 -4 0 6 0 0 0 1 0 0 0 6 4-4edge.dat
  [1,16,0,-4,0,6,0,0,0,1,0,0,0,6, ldraw_lib__4_4edge()],
// 1 16 0 0 0 6 0 0 0 -4 0 0 0 6 4-4cyli.dat
  [1,16,0,0,0,6,0,0,0,-4,0,0,0,6, ldraw_lib__4_4cyli()],
// 1 16 0 -4 0 6 0 0 0 1 0 0 0 6 4-4disc.dat
  [1,16,0,-4,0,6,0,0,0,1,0,0,0,6, ldraw_lib__4_4disc()],
  [-1,16,0,0,0,6,0,0,0,-1,0,0,0,6, ldraw_lib__4_4disc()],
];
module ldraw_lib__stud(step=0, col=false, unit=2/5, alt=false, line=0.2, solid=!$preview)
    makepoly(ldraw_lib__stud(), step=step, col=col, unit=unit, alt=alt, line=line, solid=solid);
ldraw_lib__stud(line=0.2);
// file: s/3001s02.scad
use <../../lib.scad>
use <../../p/box4.scad>
use <../../p/box5.scad>
use <../../p/stud4.scad>
function ldraw_lib__s__3001s02() = [
// 0 ~Brick  2 x  4 without Top and Top Studs
// 0 Name: s\3001s02.dat
// 0 Author: Rene Rechthaler [Blechtaler]
// 0 !LDRAW_ORG Subpart UPDATE 2024-09
// 0 !LICENSE Licensed under CC BY 4.0 : see CAreadme.txt
// 
// 0 BFC CERTIFY CCW
  [0,"BFC","CERTIFY"],
  [0,"BFC","CCW"],
// 
// 0 !HISTORY 2023-11-20 [Blechtaler] made from 3001s01
// 0 !HISTORY 2024-10-27 [OrionP] Official Update 2024-09
// 
// 1 16 20 4 0 1 0 0 0 -5 0 0 0 1 stud4.dat
  [1,16,20,4,0,1,0,0,0,-5,0,0,0,1, ldraw_lib__stud4()],
// 1 16 0 4 0 1 0 0 0 -5 0 0 0 1 stud4.dat
  [1,16,0,4,0,1,0,0,0,-5,0,0,0,1, ldraw_lib__stud4()],
// 1 16 -20 4 0 1 0 0 0 -5 0 0 0 1 stud4.dat
  [1,16,-20,4,0,1,0,0,0,-5,0,0,0,1, ldraw_lib__stud4()],
// 0 BFC INVERTNEXT
  [0,"BFC","INVERTNEXT"],
// 1 16 0 24 0 36 0 0 0 -20 0 0 0 16 box5.dat
  [1,16,0,24,0,36,0,0,0,-20,0,0,0,16, ldraw_lib__box5()],
// 4 16 40 24 20 36 24 16 -36 24 16 -40 24 20
  [4,16,40,24,20,36,24,16,-36,24,16,-40,24,20],
// 4 16 -40 24 20 -36 24 16 -36 24 -16 -40 24 -20
  [4,16,-40,24,20,-36,24,16,-36,24,-16,-40,24,-20],
// 4 16 -40 24 -20 -36 24 -16 36 24 -16 40 24 -20
  [4,16,-40,24,-20,-36,24,-16,36,24,-16,40,24,-20],
// 4 16 40 24 -20 36 24 -16 36 24 16 40 24 20
  [4,16,40,24,-20,36,24,-16,36,24,16,40,24,20],
// 1 16 0 24 0 0 0 40 0 -24 0 -20 0 0 box4.dat
  [1,16,0,24,0,0,0,40,0,-24,0,-20,0,0, ldraw_lib__box4()],
];
module ldraw_lib__s__3001s02(step=0, col=false, unit=2/5, alt=false, line=0.2, solid=!$preview)
    makepoly(ldraw_lib__s__3001s02(), step=step, col=col, unit=unit, alt=alt, line=line, solid=solid);
ldraw_lib__s__3001s02(line=0.2);
// main file
use <../lib.scad>
use <s/3001s02.scad>
use <../p/stud.scad>
function ldraw_lib__65552() = [
// 0 Brick Braille 2 x 4 with 1 Stud (DOTS-2)
// 0 Name: 65552.dat
// 0 Author: Chris Böhnke [KnightOfTarenta]
// 0 !LDRAW_ORG Part UPDATE 2025-08
// 0 !LICENSE Licensed under CC BY 4.0 : see CAreadme.txt
// 
// 0 BFC CERTIFY CCW
  [0,"BFC","CERTIFY"],
  [0,"BFC","CCW"],
// 
// 0 !HISTORY 2025-08-26 [KnightOfTarenta] Modified from 65551p01.dat by Rene Rechthaler [Blechtaler]
// 0 !HISTORY 2025-08-31 [OrionP] Official Update 2025-08
// 
// 1 16 0 0 0 1 0 0 0 1 0 0 0 1 s\3001s02.dat
  [1,16,0,0,0,1,0,0,0,1,0,0,0,1, ldraw_lib__s__3001s02()],
// 1 16 -10 0 -10 1 0 0 0 1 0 0 0 1 stud.dat
  [1,16,-10,0,-10,1,0,0,0,1,0,0,0,1, ldraw_lib__stud()],
// 
// 0 // Pattern
// 4 16 -40 0 20 -40 0 -20 40 0 -20 40 0 20
  [4,16,-40,0,20,-40,0,-20,40,0,-20,40,0,20],
];
module ldraw_lib__65552(step=0, col=false, unit=2/5, alt=false, line=0.2, solid=!$preview)
    makepoly(ldraw_lib__65552(), step=step, col=col, unit=unit, alt=alt, line=line, solid=solid);
ldraw_lib__65552(line=0.2);
